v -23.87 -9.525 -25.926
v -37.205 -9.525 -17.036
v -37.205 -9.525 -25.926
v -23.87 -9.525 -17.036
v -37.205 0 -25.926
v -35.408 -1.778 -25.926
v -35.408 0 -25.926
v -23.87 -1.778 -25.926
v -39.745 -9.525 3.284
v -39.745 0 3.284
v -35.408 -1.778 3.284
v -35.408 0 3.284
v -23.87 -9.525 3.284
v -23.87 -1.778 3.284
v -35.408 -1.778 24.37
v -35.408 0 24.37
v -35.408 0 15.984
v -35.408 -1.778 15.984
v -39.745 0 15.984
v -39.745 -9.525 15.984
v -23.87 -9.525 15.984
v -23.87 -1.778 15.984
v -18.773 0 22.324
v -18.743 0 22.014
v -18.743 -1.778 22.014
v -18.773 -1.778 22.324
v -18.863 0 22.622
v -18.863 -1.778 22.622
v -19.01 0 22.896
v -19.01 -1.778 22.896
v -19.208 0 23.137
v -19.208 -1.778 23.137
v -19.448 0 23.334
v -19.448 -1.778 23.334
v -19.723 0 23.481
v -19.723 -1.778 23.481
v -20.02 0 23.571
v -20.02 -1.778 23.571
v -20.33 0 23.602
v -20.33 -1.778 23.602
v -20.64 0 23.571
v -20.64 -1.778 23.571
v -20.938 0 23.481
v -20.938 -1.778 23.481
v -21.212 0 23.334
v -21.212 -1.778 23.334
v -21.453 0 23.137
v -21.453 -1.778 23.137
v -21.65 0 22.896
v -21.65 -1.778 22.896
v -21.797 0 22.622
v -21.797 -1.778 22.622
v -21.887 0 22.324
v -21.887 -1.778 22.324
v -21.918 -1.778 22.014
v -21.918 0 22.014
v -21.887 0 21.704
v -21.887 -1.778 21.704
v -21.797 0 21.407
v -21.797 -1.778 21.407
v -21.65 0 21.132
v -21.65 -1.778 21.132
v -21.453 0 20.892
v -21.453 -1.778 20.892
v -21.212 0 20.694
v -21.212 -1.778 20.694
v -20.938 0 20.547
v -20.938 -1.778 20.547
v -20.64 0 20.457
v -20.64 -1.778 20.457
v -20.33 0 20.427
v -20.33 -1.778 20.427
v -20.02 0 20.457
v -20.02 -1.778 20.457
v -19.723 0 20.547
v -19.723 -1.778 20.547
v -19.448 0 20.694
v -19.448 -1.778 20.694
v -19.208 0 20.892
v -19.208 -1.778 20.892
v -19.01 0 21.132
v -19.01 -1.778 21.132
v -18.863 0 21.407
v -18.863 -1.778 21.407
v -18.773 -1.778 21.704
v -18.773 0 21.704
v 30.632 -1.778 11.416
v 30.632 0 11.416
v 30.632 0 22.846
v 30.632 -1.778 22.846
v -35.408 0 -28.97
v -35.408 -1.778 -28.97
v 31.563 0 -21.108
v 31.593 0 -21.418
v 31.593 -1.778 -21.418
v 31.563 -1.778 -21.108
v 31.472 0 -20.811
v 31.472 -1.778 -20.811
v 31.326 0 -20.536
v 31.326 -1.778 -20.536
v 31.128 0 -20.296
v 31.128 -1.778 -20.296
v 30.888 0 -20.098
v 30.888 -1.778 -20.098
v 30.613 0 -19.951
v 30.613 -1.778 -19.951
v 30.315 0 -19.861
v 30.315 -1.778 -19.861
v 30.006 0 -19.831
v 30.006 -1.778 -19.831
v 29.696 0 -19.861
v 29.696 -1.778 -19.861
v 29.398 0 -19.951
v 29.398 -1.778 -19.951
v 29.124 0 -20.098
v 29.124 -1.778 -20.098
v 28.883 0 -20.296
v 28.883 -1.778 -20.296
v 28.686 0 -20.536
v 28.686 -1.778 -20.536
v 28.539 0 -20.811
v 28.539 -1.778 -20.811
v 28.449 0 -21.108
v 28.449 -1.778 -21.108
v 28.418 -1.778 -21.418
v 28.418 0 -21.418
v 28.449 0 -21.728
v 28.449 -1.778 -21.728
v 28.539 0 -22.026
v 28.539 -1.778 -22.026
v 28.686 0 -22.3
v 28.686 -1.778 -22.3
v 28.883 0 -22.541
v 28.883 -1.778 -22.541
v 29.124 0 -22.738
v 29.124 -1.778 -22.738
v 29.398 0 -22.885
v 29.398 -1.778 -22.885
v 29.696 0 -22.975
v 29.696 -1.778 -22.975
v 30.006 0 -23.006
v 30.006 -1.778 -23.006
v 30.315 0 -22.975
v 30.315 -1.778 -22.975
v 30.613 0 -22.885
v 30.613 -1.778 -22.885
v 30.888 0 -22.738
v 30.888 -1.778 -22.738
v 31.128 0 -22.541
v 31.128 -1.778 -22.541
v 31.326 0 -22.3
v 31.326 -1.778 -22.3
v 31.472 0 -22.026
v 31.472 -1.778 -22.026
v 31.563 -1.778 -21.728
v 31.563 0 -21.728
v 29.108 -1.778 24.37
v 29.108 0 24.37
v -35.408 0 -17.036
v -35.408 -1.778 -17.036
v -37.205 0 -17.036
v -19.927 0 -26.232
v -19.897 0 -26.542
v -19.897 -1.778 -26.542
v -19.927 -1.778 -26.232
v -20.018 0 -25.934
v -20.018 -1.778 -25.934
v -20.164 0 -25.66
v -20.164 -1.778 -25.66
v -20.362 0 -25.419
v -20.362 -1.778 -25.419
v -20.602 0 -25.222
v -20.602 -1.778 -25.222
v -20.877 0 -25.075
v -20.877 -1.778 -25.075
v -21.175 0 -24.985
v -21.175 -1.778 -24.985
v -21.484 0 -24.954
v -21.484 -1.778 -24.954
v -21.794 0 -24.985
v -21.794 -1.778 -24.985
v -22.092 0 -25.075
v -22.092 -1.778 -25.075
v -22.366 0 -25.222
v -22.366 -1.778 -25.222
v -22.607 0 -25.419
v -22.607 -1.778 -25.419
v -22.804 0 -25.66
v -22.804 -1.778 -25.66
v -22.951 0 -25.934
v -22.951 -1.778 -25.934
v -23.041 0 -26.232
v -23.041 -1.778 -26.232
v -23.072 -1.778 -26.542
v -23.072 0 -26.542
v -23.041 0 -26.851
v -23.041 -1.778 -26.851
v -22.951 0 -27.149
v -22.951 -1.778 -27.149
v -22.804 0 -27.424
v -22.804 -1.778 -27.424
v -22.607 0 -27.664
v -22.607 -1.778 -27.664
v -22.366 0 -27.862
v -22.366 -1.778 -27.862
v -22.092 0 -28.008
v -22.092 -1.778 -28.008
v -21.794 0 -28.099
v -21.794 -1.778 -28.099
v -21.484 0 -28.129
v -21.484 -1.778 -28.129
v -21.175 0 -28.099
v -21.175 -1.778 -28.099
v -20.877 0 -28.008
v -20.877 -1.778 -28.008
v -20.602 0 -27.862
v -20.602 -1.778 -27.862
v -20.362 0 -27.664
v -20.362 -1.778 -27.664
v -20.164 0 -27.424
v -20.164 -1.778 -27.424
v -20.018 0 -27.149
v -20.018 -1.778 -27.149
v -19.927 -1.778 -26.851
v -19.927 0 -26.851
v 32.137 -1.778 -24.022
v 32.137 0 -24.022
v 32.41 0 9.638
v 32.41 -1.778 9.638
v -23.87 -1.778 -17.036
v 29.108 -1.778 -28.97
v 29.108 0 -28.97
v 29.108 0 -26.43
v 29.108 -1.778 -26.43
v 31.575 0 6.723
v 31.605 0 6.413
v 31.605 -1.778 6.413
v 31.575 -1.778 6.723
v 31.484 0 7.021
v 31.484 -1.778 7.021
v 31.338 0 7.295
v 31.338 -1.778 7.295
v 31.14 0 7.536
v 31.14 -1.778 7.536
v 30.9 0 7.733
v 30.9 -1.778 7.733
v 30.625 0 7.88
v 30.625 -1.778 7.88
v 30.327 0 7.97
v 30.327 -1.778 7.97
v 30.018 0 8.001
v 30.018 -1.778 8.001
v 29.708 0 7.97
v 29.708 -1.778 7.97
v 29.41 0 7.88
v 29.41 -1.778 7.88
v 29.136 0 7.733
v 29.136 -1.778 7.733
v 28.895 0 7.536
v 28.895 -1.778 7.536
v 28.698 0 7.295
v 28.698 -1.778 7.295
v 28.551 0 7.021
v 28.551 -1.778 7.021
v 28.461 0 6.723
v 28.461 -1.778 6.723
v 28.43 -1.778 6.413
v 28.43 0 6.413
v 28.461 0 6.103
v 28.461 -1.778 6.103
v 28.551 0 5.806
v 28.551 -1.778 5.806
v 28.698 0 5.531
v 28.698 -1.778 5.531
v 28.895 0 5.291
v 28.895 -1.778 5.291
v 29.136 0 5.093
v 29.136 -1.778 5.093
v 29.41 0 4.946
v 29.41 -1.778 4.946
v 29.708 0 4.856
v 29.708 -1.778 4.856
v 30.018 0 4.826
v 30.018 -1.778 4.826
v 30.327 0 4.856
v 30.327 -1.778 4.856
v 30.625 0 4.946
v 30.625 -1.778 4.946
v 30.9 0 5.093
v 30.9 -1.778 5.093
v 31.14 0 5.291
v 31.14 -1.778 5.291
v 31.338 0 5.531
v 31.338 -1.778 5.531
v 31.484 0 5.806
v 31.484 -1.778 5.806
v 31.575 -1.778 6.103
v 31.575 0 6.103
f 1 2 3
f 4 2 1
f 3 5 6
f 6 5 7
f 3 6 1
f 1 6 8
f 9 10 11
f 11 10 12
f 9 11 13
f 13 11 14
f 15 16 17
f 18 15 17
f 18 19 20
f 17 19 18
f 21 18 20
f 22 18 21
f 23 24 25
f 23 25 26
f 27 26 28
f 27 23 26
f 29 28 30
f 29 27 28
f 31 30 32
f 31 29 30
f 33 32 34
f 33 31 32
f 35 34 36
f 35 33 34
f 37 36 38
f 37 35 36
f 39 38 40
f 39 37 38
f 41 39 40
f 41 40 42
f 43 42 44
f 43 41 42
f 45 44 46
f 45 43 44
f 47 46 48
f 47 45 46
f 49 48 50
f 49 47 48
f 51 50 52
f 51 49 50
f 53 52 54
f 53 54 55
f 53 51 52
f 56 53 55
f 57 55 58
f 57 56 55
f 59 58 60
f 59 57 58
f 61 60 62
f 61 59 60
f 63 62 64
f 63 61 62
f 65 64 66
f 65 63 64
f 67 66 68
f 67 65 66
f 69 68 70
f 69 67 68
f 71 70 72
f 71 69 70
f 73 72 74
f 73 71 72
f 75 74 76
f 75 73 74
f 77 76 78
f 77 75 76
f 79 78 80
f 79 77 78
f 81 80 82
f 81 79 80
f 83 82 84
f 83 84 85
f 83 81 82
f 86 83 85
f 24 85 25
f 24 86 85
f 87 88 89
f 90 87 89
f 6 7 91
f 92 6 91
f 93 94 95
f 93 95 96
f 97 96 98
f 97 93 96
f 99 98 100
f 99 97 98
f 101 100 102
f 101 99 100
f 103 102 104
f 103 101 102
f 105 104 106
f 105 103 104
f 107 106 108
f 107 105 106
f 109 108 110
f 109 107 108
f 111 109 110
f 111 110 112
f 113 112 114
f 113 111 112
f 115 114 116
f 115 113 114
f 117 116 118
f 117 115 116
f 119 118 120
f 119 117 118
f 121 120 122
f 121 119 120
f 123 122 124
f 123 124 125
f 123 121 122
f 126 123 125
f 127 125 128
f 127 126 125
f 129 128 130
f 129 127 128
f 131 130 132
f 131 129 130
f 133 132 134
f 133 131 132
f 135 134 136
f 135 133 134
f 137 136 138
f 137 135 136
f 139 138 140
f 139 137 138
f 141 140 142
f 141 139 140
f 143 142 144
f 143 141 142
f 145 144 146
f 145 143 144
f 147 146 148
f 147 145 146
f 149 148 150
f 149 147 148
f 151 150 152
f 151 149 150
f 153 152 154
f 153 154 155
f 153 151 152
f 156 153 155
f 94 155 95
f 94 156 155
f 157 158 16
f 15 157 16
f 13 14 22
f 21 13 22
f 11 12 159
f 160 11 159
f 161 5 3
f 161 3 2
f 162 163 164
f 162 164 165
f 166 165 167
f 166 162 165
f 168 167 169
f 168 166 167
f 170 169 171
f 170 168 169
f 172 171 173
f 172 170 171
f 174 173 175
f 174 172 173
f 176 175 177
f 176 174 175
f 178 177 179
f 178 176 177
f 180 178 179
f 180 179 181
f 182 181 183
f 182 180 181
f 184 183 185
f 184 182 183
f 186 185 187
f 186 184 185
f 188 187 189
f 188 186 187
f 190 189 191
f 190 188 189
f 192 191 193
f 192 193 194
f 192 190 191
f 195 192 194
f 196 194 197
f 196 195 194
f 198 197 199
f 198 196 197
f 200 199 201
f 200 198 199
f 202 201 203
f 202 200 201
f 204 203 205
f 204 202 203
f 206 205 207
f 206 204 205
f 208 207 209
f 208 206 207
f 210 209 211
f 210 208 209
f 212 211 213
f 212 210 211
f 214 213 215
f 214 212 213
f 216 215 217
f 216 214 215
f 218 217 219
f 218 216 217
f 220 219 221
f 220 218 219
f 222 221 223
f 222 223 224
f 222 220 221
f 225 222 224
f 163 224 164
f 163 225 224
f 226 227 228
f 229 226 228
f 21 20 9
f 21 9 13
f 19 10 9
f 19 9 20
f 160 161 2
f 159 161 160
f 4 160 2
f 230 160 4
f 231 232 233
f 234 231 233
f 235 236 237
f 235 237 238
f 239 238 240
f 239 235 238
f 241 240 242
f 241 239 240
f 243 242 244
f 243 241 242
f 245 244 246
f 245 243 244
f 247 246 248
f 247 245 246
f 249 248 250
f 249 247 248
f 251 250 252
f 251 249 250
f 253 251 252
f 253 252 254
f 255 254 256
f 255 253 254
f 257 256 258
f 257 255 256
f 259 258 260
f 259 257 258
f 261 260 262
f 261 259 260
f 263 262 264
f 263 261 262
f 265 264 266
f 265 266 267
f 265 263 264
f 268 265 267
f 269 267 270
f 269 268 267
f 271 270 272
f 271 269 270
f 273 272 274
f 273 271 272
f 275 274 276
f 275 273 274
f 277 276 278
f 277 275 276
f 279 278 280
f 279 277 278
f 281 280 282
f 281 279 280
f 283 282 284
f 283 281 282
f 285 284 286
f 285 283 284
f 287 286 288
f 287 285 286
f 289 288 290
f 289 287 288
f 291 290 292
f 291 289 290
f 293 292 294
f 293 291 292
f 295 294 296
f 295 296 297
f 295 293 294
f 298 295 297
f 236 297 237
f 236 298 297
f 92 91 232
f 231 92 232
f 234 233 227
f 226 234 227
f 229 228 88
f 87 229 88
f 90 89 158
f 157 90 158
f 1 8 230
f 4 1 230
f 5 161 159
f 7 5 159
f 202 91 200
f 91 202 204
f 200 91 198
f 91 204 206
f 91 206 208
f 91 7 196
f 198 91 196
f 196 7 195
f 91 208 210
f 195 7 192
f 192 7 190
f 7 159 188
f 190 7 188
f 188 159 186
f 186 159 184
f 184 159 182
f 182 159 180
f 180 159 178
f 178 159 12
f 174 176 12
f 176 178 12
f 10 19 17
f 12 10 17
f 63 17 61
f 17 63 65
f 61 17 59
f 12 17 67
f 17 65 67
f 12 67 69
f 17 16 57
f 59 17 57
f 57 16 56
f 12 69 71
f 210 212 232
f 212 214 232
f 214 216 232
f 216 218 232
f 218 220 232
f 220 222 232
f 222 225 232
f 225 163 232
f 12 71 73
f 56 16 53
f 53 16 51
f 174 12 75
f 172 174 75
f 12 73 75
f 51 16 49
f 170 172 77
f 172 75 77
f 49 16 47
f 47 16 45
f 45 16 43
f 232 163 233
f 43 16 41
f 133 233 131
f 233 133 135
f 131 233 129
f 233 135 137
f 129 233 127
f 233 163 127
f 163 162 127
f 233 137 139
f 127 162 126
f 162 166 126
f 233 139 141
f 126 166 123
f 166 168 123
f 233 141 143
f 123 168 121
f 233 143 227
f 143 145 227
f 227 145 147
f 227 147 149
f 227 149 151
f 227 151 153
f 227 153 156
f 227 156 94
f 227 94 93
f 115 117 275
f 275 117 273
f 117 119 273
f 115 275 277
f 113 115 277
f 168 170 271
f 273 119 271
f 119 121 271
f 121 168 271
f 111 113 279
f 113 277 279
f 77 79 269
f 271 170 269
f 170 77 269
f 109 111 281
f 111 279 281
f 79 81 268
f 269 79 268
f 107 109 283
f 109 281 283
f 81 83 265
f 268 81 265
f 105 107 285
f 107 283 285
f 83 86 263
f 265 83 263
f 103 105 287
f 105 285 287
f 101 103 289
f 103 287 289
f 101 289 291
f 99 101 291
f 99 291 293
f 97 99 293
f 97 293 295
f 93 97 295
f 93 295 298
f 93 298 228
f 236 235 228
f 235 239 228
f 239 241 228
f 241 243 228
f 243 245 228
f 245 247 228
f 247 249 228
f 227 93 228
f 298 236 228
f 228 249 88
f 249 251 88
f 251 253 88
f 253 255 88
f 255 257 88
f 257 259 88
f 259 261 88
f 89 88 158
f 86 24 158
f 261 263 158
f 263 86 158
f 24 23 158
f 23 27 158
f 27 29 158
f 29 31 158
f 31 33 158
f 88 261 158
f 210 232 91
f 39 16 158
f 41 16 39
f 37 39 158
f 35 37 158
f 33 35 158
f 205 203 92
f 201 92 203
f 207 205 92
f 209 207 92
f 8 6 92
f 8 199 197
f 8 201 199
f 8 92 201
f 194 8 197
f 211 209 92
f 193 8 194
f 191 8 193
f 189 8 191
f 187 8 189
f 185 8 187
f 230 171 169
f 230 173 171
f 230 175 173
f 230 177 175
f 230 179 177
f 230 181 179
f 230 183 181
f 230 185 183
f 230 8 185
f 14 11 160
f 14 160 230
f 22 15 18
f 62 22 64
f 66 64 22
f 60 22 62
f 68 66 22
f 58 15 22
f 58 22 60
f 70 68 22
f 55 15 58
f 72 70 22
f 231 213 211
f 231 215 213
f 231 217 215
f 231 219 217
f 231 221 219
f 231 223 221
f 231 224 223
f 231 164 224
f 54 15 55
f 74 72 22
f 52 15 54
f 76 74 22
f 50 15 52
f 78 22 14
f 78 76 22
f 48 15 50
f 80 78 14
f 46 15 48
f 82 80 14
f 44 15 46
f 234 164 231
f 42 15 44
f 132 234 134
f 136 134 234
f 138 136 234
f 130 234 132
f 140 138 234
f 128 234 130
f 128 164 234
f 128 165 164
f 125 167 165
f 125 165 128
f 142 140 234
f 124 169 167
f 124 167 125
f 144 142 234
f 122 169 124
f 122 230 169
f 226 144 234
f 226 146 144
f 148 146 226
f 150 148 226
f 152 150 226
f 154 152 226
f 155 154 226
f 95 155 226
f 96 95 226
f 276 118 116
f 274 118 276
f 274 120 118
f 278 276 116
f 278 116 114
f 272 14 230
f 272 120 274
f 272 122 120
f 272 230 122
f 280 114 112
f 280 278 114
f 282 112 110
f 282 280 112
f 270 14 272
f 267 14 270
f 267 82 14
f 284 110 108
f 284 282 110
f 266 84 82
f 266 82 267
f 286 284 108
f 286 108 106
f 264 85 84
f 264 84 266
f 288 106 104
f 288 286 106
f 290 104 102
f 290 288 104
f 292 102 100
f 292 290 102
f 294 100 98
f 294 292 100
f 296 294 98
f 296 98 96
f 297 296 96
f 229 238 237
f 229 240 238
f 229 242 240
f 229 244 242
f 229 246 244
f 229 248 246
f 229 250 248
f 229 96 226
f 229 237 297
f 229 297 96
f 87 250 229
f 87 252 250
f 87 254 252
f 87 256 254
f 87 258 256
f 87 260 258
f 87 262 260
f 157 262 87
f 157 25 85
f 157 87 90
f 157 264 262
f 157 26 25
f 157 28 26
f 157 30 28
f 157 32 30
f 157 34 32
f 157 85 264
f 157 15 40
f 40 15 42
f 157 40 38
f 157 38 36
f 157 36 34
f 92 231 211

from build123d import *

# Parameters (mm, degrees)
F1_DEPTH = 1.778
F2_W     = 13.335
F2_H     = 8.89
F2_W_2   = 15.875
F2_H_2   = 12.7
F3_DEPTH = 9.525
F4_R     = 1.5875
F5_DEPTH = 1.778


with BuildPart() as f1:
    # F0 (on Front) → F1 (new body)
    with BuildSketch(Plane.XZ):
        Polygon((29.10832, 24.370352), (-35.40768, 24.370352), (-35.40768, -28.969648), (29.10832, -28.969648), (29.10832, -26.429648), (32.137258, -24.022085), (32.41032, 9.638352), (30.63232, 11.416352), (30.63232, 22.846352), align=None)
    extrude(amount=F1_DEPTH)

    # F2 (on Front) → F3 (join)
    with BuildSketch(Plane.XZ):
        with Locations((-30.537364, -21.481267)):
            Rectangle(F2_W, F2_H)
        with Locations((-31.807364, 9.633733)):
            Rectangle(F2_W_2, F2_H_2)
    extrude(amount=F3_DEPTH)

    # F4 (on Front) → F5 (cut)
    with BuildSketch(Plane.XZ):
        with Locations((-20.330156, 22.014147)):
            Circle(F4_R)
        with Locations((-21.484396, -26.541674)):
            Circle(F4_R)
        with Locations((30.017542, 6.413083)):
            Circle(F4_R)
        with Locations((30.00577, -21.418037)):
            Circle(F4_R)
    extrude(amount=F5_DEPTH, mode=Mode.SUBTRACT)


solid = f1.part
